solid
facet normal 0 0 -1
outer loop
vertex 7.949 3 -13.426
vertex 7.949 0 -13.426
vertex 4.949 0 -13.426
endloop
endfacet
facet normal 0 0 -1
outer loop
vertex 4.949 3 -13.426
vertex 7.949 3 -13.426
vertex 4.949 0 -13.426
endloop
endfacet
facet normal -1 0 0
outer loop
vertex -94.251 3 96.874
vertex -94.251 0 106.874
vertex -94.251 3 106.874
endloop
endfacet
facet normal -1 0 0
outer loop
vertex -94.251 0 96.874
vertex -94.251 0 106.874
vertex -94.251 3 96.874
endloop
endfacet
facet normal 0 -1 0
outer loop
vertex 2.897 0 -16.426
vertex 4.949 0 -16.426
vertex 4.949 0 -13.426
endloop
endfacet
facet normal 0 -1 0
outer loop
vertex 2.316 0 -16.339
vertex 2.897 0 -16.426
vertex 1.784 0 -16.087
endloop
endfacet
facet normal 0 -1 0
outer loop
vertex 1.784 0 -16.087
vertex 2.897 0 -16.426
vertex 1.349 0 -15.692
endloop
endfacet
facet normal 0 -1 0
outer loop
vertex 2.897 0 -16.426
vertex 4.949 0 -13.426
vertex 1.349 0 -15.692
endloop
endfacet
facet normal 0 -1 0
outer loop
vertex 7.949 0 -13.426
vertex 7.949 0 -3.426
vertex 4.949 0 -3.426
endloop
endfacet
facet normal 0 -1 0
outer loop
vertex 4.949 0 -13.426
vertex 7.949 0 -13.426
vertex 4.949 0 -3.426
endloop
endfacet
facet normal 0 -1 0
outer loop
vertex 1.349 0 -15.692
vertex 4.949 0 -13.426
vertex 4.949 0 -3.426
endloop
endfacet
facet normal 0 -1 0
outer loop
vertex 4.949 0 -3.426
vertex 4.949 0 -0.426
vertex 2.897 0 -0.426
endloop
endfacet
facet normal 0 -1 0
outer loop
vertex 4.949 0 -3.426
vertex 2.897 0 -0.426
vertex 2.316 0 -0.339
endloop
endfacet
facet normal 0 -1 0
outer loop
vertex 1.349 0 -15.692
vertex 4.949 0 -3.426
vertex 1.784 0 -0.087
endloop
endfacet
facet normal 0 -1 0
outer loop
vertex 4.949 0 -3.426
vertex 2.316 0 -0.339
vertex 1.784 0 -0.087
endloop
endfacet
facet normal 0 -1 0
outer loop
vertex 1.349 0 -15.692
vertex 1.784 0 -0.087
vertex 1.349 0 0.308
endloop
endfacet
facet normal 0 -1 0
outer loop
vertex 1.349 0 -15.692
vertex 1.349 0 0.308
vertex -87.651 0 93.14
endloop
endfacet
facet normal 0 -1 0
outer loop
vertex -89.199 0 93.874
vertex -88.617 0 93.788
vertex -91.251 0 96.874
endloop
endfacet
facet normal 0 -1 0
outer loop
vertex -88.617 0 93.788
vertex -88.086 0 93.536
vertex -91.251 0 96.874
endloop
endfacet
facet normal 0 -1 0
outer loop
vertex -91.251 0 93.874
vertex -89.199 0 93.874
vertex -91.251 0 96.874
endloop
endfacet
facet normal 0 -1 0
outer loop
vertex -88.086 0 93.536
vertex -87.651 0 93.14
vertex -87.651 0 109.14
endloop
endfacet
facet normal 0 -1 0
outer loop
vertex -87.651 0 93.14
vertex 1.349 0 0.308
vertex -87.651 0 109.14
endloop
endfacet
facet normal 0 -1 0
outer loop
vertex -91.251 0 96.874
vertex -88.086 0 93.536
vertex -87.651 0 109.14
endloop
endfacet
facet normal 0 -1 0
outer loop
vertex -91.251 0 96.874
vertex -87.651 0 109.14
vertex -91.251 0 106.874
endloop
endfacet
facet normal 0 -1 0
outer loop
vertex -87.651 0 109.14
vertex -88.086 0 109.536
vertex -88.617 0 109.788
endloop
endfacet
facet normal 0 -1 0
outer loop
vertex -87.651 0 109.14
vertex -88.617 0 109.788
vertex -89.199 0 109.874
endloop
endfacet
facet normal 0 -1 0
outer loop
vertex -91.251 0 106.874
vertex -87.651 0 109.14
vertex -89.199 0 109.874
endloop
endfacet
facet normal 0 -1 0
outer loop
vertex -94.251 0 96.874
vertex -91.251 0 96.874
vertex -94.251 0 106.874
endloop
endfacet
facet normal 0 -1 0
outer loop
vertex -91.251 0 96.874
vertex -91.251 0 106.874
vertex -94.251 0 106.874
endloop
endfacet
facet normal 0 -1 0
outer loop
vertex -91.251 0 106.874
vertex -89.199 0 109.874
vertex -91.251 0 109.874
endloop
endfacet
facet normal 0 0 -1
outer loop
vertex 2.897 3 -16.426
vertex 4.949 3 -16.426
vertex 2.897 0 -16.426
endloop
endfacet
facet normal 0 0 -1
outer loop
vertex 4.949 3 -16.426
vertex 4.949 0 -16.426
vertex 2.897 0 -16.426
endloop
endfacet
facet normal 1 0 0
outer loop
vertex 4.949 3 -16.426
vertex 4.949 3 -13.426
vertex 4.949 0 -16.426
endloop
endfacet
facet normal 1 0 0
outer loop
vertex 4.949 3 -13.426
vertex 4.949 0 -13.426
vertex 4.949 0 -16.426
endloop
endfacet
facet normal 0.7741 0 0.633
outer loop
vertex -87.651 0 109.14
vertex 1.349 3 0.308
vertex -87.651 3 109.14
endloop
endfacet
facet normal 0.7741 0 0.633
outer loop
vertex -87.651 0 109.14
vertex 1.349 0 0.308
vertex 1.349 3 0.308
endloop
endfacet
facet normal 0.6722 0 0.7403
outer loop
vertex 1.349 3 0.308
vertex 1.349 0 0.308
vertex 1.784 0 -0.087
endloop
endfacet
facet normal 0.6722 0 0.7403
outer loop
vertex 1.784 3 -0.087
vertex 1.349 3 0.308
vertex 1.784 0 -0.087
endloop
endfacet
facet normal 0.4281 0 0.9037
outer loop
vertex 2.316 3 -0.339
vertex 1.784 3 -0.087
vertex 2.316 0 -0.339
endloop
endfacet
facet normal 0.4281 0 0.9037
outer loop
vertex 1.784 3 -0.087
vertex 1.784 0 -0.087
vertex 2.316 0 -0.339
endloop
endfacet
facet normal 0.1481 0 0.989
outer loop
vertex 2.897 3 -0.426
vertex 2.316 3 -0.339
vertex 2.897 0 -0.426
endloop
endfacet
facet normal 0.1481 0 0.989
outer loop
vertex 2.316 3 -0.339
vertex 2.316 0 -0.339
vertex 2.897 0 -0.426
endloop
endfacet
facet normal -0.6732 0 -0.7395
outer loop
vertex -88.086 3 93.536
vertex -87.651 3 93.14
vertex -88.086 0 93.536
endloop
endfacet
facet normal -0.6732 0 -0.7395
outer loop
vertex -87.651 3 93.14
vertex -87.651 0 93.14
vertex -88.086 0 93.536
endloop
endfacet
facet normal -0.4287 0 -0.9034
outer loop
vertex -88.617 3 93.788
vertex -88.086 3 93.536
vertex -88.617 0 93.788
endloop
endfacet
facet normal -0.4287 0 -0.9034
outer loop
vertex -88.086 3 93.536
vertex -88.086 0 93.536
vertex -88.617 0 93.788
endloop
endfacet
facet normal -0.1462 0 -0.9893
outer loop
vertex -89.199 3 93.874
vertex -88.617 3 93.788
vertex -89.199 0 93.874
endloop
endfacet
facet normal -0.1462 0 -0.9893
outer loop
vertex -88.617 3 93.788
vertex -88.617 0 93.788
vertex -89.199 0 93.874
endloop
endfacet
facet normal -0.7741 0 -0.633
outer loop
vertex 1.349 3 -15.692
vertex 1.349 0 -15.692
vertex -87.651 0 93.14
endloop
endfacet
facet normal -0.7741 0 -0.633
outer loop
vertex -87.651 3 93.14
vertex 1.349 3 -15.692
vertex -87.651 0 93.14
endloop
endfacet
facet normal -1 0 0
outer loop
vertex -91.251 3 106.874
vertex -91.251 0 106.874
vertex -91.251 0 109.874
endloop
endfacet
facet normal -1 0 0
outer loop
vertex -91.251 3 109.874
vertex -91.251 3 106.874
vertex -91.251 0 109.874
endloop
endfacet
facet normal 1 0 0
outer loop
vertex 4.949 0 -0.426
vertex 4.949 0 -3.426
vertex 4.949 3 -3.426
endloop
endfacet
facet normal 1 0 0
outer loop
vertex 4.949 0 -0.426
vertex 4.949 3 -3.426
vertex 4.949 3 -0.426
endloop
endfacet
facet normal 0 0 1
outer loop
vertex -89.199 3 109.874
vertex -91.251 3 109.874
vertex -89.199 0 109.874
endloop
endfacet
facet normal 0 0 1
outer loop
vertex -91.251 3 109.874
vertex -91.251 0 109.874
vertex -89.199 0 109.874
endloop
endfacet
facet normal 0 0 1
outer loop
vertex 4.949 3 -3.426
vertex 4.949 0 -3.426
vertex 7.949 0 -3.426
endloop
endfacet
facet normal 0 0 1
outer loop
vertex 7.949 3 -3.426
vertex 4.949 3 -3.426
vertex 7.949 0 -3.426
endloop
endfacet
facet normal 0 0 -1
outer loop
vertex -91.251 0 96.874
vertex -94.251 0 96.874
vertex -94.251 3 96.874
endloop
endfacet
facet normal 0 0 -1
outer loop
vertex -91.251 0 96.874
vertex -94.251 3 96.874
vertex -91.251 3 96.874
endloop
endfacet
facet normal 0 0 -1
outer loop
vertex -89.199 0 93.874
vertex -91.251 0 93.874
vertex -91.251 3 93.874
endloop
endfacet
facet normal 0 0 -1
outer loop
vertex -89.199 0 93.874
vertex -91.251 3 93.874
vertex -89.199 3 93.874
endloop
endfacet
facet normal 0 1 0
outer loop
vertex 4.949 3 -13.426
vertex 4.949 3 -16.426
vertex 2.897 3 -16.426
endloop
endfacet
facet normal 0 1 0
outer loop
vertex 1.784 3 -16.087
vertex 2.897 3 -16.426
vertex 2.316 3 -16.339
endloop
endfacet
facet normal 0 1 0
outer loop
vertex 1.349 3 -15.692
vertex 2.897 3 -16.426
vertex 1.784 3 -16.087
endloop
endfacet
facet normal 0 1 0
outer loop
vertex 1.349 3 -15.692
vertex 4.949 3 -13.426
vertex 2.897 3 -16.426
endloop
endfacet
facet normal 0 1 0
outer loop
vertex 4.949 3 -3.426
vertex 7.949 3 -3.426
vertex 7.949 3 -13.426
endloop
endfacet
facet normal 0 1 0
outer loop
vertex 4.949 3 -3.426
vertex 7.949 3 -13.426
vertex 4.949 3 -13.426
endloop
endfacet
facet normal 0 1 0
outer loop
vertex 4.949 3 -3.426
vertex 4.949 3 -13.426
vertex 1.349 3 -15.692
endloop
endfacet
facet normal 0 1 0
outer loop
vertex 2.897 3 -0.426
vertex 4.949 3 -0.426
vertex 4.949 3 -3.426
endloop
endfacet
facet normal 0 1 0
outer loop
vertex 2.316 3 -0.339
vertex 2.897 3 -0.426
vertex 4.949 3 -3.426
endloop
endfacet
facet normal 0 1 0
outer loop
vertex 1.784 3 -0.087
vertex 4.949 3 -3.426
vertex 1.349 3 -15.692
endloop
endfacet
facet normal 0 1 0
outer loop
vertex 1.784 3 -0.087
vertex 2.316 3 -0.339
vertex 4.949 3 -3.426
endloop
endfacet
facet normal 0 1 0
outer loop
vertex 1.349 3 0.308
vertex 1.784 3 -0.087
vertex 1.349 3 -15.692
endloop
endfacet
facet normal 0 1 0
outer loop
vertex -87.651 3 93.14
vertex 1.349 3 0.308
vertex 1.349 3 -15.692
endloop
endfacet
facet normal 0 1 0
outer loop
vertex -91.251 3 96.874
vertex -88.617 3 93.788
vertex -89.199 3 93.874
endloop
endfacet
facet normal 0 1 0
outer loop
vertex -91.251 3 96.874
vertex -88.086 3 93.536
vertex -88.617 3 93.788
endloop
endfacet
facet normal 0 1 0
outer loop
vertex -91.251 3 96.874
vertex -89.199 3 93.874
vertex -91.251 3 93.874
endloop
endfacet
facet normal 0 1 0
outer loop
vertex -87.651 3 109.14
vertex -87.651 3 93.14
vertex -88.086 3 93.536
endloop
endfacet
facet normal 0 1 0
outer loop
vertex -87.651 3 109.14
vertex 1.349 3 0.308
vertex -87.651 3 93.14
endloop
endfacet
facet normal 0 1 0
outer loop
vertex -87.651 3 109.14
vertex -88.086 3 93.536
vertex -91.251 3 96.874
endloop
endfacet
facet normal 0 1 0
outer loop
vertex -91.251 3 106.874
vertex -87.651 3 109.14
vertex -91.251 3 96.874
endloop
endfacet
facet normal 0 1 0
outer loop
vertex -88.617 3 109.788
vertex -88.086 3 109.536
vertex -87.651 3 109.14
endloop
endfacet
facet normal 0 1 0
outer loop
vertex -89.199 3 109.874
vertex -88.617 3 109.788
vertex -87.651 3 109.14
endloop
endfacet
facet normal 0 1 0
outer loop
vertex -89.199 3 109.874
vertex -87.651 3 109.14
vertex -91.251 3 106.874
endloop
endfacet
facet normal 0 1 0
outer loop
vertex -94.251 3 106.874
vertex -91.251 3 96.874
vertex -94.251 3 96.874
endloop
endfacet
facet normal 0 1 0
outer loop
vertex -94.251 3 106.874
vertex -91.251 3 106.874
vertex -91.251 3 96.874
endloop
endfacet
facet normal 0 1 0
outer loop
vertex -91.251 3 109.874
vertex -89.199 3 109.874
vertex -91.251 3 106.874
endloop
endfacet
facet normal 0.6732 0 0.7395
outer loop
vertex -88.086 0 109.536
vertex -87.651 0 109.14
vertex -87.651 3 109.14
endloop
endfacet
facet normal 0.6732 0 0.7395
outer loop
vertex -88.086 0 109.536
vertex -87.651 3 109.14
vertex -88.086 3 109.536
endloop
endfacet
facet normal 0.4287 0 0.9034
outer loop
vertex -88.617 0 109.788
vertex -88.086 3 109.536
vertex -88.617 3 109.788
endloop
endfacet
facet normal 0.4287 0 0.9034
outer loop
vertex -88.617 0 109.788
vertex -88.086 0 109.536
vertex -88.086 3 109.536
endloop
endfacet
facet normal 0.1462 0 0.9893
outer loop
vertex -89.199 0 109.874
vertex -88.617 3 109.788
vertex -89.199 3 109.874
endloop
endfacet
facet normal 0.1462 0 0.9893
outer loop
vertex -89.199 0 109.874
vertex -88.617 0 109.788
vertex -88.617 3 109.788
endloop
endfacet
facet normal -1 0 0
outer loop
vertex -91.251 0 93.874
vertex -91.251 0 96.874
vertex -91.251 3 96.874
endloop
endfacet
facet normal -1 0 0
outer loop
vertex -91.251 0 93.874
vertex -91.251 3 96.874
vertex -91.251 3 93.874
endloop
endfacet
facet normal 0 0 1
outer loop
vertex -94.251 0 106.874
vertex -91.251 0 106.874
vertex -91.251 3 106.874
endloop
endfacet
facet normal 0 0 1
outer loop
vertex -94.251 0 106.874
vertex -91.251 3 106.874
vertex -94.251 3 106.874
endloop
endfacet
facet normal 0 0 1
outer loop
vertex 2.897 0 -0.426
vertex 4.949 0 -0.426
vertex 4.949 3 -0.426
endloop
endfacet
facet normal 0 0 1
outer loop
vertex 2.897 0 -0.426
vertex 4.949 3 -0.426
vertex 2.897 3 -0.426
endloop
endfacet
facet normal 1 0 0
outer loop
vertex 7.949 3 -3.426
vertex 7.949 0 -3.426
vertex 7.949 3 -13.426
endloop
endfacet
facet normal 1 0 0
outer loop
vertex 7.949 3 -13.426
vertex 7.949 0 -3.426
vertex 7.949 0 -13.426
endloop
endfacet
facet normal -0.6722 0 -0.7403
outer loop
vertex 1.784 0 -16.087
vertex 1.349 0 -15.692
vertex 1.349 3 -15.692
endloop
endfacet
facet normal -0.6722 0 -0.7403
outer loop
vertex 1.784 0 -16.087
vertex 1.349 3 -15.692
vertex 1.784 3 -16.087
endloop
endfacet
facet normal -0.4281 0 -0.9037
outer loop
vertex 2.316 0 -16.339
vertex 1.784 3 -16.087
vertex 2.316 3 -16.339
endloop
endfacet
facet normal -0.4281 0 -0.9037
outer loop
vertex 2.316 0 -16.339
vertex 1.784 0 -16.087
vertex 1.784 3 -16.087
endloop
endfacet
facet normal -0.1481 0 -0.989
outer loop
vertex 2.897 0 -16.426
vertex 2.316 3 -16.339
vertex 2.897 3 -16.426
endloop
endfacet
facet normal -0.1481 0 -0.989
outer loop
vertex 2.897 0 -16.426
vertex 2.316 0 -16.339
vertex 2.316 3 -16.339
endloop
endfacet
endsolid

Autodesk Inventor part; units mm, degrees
ref_plane "YZ Plane" through (0, 0, 0) normal (1, 0, 0) x (0, 1, 0)
ref_plane "XZ Plane" through (0, 0, 0) normal (0, 1, 0) x (-1, 0, 0)
ref_plane "XY Plane" through (0, 0, 0) normal (0, 0, 1) x (1, 0, 0)
sketch "Sketch1" plane through (0, 0, 0) normal (0, 1, 0) x (-1, 0, 0)
  line L0 (-4.9492, -3.4256) -> (-7.9492, -3.4256)
  line L1 (-7.9492, -3.4256) -> (-7.9492, -13.4256)
  line L2 (-7.9492, -13.4256) -> (-4.9492, -13.4256)
  line L3 (-4.9492, -3.4256) -> (-4.9492, -0.4256)
  line L4 (-4.9492, -13.4256) -> (-4.9492, -16.4256)
  line L5 (-4.9492, -16.4256) -> (-2.8973, -16.4256)
  line L6 (-4.9492, -0.4256) -> (-2.8973, -0.4256)
  line L7 (91.2508, 106.8744) -> (94.2508, 106.8744)
  line L8 (94.2508, 106.8744) -> (94.2508, 96.8744)
  line L9 (94.2508, 96.8744) -> (91.2508, 96.8744)
  line L10 (91.2508, 106.8744) -> (91.2508, 109.8744)
  line L11 (91.2508, 96.8744) -> (91.2508, 93.8744)
  line L12 (91.2508, 93.8744) -> (89.1989, 93.8744)
  line L13 (91.2508, 109.8744) -> (89.1989, 109.8744)
  arc A0 (89.1989, 109.8744) -> (87.6506, 109.1404) centre (89.1989, 107.8744) ccw
  line L14 (-1.349, 0.3083) -> (87.6506, 109.1404)
  arc A1 (-2.8973, -0.4256) -> (-1.349, 0.3083) centre (-2.8973, 1.5744) ccw
  line L15 (-1.349, -15.6917) -> (87.6506, 93.1404)
  arc A2 (89.1989, 93.8744) -> (87.6506, 93.1404) centre (89.1989, 91.8744) ccw
  arc A3 (-2.8973, -16.4256) -> (-1.349, -15.6917) centre (-2.8973, -14.4256) ccw
  point P0 (0, 0)
extrude "Extrusion1" add sketch "Sketch1" along normal blind 3
properties part number "angularBrace" material "Polycarbonate, Clear"
